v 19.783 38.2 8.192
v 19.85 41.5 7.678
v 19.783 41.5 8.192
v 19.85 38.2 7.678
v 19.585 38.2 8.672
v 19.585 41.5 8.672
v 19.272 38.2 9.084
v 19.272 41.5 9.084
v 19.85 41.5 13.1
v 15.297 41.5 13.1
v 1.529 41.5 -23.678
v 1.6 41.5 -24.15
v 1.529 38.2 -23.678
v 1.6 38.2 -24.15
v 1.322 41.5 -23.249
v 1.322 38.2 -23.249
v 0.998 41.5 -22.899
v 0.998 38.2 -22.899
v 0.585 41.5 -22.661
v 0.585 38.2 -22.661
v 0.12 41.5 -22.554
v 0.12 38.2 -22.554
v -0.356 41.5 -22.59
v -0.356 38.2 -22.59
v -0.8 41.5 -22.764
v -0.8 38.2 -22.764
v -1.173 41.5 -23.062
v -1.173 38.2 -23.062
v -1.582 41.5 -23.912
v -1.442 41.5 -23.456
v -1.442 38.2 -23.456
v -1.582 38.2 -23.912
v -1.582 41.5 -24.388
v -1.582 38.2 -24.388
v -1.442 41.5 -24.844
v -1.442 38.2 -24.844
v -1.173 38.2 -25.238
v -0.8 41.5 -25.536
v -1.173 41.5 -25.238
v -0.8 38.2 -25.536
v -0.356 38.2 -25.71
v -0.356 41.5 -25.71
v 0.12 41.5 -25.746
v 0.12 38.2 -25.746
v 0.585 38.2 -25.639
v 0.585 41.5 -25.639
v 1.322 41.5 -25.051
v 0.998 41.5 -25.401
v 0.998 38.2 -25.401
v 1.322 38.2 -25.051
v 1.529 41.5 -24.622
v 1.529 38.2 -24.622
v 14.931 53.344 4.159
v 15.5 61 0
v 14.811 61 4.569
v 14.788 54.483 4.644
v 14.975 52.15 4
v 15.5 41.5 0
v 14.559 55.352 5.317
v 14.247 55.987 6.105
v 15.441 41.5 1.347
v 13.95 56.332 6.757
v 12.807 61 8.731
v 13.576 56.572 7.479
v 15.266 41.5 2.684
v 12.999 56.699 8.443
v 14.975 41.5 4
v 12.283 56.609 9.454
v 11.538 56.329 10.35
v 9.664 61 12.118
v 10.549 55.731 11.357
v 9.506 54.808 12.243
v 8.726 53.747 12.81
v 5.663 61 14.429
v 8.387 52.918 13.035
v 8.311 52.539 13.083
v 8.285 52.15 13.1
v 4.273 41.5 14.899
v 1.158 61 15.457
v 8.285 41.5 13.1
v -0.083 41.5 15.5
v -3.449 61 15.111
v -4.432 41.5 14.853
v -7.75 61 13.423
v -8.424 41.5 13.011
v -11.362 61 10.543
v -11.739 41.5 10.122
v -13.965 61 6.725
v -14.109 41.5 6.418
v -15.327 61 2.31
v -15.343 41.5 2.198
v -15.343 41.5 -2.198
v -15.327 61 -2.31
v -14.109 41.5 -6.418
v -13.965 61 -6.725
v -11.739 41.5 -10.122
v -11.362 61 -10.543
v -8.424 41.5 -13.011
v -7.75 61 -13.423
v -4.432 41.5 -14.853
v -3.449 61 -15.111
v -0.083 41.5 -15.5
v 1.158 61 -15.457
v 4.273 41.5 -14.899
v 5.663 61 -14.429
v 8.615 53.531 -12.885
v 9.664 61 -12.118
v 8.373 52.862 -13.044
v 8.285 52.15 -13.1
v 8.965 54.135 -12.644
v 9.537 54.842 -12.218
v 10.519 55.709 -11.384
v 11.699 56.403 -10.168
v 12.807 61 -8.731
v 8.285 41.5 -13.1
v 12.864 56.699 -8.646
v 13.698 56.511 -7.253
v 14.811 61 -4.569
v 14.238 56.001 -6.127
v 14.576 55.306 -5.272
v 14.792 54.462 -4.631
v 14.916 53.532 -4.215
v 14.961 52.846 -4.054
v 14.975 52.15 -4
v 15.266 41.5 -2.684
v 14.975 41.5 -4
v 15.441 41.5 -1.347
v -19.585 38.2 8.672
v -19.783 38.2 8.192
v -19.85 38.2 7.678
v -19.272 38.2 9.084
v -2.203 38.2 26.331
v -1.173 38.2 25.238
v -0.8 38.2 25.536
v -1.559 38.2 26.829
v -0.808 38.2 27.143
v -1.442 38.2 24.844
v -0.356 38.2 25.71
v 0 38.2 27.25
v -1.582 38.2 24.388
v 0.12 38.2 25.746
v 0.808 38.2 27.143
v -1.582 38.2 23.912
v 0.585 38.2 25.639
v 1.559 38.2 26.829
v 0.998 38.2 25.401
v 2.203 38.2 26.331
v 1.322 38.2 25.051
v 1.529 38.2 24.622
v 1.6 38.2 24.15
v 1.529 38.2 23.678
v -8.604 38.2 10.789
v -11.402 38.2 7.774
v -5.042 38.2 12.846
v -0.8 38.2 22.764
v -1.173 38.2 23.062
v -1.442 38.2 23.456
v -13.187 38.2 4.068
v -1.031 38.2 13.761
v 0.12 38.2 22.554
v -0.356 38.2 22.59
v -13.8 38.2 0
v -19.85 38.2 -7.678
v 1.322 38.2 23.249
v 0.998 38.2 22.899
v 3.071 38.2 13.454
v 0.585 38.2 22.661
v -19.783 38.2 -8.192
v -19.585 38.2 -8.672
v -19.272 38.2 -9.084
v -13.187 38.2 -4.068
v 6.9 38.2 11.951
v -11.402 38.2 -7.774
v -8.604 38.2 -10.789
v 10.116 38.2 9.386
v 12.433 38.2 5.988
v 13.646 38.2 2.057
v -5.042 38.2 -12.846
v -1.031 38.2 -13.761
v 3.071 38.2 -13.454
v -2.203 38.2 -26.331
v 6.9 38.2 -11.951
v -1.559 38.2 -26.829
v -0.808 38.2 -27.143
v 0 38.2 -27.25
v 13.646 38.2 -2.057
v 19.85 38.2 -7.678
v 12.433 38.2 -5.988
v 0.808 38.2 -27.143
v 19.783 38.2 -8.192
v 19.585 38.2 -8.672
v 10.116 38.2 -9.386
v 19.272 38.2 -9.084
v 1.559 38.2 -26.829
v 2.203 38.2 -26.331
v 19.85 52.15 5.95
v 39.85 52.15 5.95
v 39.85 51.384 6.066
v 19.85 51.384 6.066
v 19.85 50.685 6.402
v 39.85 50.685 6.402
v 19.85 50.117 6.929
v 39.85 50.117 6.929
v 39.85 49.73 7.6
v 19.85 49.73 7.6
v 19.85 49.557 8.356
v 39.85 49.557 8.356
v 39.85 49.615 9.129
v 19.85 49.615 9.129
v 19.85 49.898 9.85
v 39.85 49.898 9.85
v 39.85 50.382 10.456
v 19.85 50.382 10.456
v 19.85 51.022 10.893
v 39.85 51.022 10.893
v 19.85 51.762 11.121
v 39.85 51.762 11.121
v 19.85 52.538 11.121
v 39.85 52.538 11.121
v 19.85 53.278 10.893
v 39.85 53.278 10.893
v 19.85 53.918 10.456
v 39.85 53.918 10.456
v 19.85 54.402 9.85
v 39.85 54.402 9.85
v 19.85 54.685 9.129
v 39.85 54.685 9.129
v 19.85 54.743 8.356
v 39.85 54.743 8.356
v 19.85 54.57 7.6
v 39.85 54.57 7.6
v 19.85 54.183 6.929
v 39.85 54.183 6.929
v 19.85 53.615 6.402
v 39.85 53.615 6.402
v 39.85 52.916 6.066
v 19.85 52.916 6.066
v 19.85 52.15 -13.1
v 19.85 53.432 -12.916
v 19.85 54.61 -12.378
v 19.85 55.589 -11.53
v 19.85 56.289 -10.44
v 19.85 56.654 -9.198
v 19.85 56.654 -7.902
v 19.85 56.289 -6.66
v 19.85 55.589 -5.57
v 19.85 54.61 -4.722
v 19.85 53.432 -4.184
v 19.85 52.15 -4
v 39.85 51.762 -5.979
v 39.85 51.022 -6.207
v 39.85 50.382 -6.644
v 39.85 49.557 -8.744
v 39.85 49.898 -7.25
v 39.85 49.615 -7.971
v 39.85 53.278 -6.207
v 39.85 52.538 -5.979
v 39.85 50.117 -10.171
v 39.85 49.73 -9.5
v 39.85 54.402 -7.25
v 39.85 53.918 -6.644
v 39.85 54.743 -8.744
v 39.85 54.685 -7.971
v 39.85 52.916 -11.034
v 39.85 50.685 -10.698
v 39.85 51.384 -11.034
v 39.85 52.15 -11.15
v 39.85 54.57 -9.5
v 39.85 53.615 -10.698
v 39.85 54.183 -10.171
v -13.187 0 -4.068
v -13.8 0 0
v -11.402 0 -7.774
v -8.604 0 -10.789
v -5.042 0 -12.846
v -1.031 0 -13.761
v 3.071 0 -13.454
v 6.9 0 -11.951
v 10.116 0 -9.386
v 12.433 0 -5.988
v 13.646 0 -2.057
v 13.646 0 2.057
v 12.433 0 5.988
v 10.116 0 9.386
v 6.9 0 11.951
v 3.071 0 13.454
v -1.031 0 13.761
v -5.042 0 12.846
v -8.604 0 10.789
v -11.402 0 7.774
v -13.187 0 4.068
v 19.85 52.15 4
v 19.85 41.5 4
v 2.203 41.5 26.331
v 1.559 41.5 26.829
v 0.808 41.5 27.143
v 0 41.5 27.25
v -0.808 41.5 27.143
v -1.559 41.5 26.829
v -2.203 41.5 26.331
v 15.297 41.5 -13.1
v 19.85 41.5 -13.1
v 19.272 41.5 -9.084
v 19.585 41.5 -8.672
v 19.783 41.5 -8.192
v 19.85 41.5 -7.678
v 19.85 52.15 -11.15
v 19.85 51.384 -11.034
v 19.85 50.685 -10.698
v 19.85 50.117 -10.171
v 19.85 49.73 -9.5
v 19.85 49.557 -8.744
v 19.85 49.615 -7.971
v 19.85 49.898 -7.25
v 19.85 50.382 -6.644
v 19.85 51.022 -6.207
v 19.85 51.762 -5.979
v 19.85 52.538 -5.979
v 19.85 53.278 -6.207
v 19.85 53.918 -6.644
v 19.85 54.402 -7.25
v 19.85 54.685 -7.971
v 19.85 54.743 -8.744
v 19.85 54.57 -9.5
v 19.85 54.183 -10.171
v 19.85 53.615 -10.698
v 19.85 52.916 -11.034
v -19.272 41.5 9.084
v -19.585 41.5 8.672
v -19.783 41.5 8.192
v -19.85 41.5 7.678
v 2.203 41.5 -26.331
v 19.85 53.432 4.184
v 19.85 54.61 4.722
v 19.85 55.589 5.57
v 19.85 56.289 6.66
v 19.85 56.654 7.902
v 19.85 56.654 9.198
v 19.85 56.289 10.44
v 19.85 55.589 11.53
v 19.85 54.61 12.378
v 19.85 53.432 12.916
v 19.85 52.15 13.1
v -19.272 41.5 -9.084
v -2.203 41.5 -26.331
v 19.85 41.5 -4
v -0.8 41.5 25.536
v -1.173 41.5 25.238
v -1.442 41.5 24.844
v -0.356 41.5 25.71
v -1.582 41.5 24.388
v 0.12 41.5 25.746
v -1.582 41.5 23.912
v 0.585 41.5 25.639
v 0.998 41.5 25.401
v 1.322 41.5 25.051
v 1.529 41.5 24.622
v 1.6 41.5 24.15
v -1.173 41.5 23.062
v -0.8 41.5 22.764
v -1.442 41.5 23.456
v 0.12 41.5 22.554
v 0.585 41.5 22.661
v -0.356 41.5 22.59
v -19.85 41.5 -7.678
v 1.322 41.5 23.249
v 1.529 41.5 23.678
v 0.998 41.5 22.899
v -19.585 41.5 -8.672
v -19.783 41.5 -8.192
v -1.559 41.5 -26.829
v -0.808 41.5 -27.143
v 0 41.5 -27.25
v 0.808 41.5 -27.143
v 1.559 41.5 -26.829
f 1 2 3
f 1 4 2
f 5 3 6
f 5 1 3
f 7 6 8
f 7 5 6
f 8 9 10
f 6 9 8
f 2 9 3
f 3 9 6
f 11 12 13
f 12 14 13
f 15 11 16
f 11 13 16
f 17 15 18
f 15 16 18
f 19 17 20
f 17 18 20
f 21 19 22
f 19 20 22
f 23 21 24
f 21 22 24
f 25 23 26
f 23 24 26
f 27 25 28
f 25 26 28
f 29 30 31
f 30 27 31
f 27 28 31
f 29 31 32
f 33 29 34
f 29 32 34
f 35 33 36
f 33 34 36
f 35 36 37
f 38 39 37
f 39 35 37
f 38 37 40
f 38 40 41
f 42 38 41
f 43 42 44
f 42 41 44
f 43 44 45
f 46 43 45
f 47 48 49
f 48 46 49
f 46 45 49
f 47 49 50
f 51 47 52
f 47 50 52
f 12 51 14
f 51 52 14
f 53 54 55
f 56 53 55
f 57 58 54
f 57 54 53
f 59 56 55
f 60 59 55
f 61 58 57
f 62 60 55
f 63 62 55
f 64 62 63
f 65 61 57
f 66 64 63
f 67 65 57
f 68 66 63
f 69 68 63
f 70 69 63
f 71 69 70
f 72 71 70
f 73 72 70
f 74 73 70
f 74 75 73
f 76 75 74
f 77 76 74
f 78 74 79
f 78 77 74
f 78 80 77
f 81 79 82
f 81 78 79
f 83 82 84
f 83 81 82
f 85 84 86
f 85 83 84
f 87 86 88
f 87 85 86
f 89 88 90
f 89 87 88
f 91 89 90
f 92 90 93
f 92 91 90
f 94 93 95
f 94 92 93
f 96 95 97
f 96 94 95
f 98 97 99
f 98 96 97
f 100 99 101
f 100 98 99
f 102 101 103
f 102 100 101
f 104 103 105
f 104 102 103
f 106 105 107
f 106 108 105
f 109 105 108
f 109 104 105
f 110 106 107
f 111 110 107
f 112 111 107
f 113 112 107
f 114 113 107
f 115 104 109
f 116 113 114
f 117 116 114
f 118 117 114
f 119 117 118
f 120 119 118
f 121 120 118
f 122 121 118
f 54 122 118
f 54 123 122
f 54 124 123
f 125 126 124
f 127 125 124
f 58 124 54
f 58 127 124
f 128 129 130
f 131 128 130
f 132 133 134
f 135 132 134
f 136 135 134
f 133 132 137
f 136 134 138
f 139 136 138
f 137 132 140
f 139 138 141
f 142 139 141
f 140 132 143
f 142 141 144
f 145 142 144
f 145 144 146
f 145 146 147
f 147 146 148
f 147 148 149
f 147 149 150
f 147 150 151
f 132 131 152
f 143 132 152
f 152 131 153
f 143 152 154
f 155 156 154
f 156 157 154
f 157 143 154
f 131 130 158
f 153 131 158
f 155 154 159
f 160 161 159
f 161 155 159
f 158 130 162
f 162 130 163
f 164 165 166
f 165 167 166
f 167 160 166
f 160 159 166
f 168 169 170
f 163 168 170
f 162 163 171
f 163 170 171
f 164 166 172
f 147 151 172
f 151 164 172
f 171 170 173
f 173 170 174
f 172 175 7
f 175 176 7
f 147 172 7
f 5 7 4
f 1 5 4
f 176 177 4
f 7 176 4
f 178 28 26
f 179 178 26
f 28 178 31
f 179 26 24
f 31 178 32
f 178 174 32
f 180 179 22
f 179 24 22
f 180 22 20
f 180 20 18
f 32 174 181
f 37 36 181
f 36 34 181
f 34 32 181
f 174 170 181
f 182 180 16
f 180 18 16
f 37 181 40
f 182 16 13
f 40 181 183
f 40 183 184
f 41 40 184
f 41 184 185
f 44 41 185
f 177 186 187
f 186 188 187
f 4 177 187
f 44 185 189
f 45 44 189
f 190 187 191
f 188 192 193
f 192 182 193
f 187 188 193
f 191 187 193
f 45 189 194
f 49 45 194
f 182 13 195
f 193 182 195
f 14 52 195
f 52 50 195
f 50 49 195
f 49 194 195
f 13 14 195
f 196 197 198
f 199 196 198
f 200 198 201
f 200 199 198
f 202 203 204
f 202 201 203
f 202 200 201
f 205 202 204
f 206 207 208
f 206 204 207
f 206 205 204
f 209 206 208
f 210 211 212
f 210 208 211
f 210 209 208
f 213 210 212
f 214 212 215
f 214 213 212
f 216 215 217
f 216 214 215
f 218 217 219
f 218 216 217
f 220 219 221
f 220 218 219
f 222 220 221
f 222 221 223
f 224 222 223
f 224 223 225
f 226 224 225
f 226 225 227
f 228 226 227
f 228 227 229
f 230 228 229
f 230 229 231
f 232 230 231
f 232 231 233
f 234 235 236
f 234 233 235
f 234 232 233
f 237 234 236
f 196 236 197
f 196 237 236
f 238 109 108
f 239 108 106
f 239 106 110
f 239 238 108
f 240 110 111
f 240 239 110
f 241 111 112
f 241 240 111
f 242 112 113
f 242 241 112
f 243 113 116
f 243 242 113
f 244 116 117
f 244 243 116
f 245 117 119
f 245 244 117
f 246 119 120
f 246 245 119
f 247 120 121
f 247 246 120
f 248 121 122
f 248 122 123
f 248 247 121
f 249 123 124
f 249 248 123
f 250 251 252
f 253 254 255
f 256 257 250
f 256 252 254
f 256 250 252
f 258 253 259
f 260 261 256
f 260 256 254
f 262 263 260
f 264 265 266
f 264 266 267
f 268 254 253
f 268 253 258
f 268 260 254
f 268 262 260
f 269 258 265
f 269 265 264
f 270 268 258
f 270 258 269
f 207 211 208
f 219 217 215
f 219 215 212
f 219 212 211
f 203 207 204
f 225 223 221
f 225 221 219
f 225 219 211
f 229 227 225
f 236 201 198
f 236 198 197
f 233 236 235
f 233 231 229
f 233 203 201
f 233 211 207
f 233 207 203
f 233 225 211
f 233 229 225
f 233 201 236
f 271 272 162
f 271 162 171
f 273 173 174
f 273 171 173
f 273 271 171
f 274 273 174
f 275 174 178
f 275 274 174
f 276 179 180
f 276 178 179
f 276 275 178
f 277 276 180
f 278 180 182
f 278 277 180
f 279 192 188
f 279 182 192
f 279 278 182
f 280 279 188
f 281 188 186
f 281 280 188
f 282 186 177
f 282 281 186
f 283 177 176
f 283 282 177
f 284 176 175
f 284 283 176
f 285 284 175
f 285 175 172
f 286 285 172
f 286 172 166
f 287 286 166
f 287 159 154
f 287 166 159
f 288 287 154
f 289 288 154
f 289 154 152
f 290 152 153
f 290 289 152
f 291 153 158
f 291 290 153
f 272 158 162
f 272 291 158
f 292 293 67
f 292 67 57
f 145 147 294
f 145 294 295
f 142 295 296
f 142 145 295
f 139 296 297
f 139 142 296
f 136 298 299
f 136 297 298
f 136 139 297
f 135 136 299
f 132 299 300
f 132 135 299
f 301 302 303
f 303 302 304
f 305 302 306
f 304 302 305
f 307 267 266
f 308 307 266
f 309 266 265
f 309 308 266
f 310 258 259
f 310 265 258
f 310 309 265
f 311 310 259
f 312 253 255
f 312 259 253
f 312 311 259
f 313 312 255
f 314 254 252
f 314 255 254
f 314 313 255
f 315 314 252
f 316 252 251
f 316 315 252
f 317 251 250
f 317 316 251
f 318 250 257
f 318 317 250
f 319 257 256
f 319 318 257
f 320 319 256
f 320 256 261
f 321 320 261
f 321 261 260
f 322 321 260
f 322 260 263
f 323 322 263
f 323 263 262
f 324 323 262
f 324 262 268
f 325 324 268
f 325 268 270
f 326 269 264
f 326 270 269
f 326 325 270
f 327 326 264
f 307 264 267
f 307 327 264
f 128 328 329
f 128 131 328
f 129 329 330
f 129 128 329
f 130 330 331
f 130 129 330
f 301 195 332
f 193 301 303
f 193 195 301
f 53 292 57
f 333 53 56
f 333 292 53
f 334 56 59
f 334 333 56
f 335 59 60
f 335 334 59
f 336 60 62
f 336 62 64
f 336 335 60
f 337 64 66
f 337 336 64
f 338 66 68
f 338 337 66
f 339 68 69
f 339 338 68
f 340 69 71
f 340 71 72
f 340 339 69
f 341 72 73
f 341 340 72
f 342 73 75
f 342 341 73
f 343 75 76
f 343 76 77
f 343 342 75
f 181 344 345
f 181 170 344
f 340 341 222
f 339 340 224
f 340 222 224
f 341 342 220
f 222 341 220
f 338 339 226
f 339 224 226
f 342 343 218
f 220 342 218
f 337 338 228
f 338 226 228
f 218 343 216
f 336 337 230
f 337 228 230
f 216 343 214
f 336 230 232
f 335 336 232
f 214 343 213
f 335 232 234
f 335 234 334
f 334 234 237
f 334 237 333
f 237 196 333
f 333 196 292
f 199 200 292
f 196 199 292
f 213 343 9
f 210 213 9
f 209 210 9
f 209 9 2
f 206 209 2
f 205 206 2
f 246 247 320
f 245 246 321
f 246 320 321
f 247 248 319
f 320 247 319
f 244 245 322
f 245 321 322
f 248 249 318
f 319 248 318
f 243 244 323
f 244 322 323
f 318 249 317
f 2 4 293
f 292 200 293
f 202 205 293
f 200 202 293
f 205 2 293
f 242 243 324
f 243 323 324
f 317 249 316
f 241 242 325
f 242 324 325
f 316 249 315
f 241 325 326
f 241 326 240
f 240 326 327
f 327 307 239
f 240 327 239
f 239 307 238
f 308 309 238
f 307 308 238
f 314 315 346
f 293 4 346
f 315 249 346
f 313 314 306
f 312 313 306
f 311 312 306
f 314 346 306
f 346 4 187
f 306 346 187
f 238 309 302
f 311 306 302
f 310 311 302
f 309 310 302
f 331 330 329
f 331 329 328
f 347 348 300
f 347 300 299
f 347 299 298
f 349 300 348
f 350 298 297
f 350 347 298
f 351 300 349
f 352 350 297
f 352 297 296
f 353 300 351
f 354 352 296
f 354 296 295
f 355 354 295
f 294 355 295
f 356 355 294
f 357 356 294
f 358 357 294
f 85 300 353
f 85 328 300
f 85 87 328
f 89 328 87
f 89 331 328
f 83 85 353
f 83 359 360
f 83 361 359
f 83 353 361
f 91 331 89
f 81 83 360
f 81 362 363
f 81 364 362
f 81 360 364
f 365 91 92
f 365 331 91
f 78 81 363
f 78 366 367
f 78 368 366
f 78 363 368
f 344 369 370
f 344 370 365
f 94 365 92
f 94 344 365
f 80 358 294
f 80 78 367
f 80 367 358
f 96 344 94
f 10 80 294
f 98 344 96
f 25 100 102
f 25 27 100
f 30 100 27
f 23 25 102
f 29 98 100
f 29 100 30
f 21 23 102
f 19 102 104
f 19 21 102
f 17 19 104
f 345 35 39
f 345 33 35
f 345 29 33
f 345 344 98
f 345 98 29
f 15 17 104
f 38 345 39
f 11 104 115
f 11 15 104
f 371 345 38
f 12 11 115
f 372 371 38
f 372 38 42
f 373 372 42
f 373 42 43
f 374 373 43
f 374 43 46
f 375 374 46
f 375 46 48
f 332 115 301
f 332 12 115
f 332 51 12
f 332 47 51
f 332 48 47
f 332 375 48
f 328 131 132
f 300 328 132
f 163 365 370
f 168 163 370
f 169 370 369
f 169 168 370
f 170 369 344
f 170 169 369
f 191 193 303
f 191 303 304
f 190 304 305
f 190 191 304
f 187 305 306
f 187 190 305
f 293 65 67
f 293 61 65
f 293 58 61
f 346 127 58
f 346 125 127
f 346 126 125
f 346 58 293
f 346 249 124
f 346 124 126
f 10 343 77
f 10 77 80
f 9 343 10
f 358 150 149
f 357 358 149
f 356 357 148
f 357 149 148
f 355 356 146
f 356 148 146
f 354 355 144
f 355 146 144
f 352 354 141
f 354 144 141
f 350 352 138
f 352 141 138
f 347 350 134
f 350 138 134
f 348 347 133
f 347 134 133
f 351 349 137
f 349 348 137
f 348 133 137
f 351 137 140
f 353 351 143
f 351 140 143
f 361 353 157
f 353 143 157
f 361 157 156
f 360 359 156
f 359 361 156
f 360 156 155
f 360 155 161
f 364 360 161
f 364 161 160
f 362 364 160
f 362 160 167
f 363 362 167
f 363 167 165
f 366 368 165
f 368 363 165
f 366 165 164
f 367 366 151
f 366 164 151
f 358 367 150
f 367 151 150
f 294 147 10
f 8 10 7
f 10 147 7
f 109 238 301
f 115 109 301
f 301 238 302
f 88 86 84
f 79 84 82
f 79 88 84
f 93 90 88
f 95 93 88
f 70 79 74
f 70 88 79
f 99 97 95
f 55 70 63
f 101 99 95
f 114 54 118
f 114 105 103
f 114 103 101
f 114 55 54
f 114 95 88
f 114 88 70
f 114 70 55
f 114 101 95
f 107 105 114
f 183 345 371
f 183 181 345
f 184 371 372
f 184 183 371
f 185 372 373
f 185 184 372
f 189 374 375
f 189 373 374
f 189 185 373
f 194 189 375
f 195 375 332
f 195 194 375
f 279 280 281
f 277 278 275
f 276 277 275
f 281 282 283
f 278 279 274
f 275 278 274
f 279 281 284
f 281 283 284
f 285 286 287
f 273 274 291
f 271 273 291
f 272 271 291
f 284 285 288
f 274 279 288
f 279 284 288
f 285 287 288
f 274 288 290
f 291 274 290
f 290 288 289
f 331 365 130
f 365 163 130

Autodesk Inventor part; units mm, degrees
ref_plane "YZ Plane" through (0, 0, 0) normal (1, 0, 0) x (0, 1, 0)
ref_plane "XZ Plane" through (0, 0, 0) normal (0, 1, 0) x (-1, 0, 0)
ref_plane "XY Plane" through (0, 0, 0) normal (0, 0, 1) x (1, 0, 0)
sketch "Sketch1" plane through (0, 0, 0) normal (0, 1, 0) x (-1, 0, 0)
  circle A0 centre (0, 0) radius 13.8
  dimension "d0" = 27.6
extrude "Extrusion1" add sketch "Sketch1" along normal blind 38.2
sketch "Sketch2" plane through (0, 38.2, 0) normal (0, 1, 0) x (1, 0, 0)
  line L0 (-19.85, -8.5) -> (19.85, -8.5) construction
  line L1 (19.85, -7.6776) -> (19.85, 7.6776)
  line L2 (19.85, 8.5) -> (-19.85, 8.5) construction
  line L3 (-19.85, 7.6776) -> (-19.85, -7.6776)
  line L4 (-19.2715, -9.0845) -> (-2.2034, -26.3306)
  line L5 (-2.2034, -26.3306) -> (2.2034, -26.3306) construction
  line L6 (2.2034, -26.3306) -> (19.2715, -9.0845)
  arc A0 (-2.2034, -26.3306) -> (2.2034, -26.3306) centre (0, -24.15) ccw
  circle A1 centre (0, -24.15) radius 1.6
  line L7 (-19.85, 0) -> (19.85, 0) construction
  line L8 (-19.2715, 9.0845) -> (-2.2034, 26.3306)
  line L9 (2.2034, 26.3306) -> (19.2715, 9.0845)
  arc A2 (2.2034, 26.3306) -> (-2.2034, 26.3306) centre (0, 24.15) ccw
  circle A3 centre (0, 24.15) radius 1.6
  arc A4 (-19.85, -7.6776) -> (-19.2715, -9.0845) centre (-17.85, -7.6776) ccw
  arc A5 (-19.2715, 9.0845) -> (-19.85, 7.6776) centre (-17.85, 7.6776) ccw
  arc A6 (19.85, 7.6776) -> (19.2715, 9.0845) centre (17.85, 7.6776) ccw
  arc A7 (19.2715, -9.0845) -> (19.85, -7.6776) centre (17.85, -7.6776) ccw
  point P0 (0, 0)
  point P1 (0, 8.5)
  point P2 (0, -27.25)
  dimension "d3" = 39.7
  dimension "d4" = 17
  dimension "d6" = 3.2
  dimension "d7" = 1.5
  dimension "d8" = 27.25
  dimension "d9" = 2
extrude "Extrusion2" add sketch "Sketch2" along normal blind 3.3
sketch "Sketch3" plane through (0, 41.5, 0) normal (0, 1, 0) x (1, 0, 0)
  circle A0 centre (0, 0) radius 13.8 construction
  circle A1 centre (0, 0) radius 15.5
  dimension "d12" = 31
extrude "Extrusion3" add sketch "Sketch3" along normal blind 19.5
sketch "Sketch4" plane through (19.85, 38.2, 7.6776) normal (1, 0, 0) x (0, 0, -1)
  line L0 (23.1776, 22.8) -> (-7.8224, 22.8) projected
  line L1 (-7.8224, 3.3) -> (23.1776, 3.3) construction
  line L2 (-7.8224, 3.3) -> (-7.8224, 22.8) projected
  line L3 (23.1776, 3.3) -> (23.1776, 22.8) projected
  line L4 (3.6776, 18.5) -> (11.6776, 18.5)
  line L5 (11.6776, 18.5) -> (11.6776, 3.3)
  line L6 (11.6776, 3.3) -> (3.6776, 3.3)
  line L7 (3.6776, 3.3) -> (3.6776, 18.5)
  line L8 (0, 3.3) -> (15.3553, 3.3) projected
  line L9 (3.6776, 18.5) -> (-5.4224, 18.5)
  line L10 (-5.4224, 18.5) -> (-5.4224, 3.3)
  line L11 (-5.4224, 3.3) -> (3.6776, 3.3)
  line L12 (3.6776, 3.3) -> (3.6776, 18.5)
  line L13 (7.6776, 3.3) -> (7.6776, 18.5) construction
  arc A0 (3.6776, 13.95) -> (-5.4224, 13.95) centre (-0.8724, 13.95) ccw
  line L14 (20.7776, 18.5) -> (20.7776, 3.3)
  line L15 (20.7776, 3.3) -> (11.6776, 3.3)
  arc A1 (20.7776, 13.95) -> (11.6776, 13.95) centre (16.2276, 13.95) ccw
  point P0 (7.6776, -38.2)
  point P1 (11.6776, 13.95)
  point P2 (3.6776, 13.95)
  dimension "d15" = 8
  dimension "d16" = 15.2
  dimension "d17" = 9.1
extrude "Extrusion4" add sketch "Sketch4" against normal up to surface contours L7 L8 L11 L10 A0 | A1 L14 L15 L8 L5
sketch "Sketch5" plane through (19.85, 38.2, 7.6776) normal (1, 0, 0) x (0, 0, -1)
  arc A0 (3.6776, 13.95) -> (-5.4224, 13.95) centre (-0.8724, 13.95) ccw projected
  arc A1 (20.7776, 13.95) -> (11.6776, 13.95) centre (16.2276, 13.95) ccw projected
  circle A2 centre (-0.8724, 13.95) radius 2.6
  circle A3 centre (16.2276, 13.95) radius 2.6
  point P0 (7.6776, -38.2)
  dimension "d20" = 5.2
  dimension "d21" = 5.2
extrude "Extrusion5" add sketch "Sketch5" along normal blind 20
equation "\"d18\" = d16"
properties part number "peristaltic pump"
